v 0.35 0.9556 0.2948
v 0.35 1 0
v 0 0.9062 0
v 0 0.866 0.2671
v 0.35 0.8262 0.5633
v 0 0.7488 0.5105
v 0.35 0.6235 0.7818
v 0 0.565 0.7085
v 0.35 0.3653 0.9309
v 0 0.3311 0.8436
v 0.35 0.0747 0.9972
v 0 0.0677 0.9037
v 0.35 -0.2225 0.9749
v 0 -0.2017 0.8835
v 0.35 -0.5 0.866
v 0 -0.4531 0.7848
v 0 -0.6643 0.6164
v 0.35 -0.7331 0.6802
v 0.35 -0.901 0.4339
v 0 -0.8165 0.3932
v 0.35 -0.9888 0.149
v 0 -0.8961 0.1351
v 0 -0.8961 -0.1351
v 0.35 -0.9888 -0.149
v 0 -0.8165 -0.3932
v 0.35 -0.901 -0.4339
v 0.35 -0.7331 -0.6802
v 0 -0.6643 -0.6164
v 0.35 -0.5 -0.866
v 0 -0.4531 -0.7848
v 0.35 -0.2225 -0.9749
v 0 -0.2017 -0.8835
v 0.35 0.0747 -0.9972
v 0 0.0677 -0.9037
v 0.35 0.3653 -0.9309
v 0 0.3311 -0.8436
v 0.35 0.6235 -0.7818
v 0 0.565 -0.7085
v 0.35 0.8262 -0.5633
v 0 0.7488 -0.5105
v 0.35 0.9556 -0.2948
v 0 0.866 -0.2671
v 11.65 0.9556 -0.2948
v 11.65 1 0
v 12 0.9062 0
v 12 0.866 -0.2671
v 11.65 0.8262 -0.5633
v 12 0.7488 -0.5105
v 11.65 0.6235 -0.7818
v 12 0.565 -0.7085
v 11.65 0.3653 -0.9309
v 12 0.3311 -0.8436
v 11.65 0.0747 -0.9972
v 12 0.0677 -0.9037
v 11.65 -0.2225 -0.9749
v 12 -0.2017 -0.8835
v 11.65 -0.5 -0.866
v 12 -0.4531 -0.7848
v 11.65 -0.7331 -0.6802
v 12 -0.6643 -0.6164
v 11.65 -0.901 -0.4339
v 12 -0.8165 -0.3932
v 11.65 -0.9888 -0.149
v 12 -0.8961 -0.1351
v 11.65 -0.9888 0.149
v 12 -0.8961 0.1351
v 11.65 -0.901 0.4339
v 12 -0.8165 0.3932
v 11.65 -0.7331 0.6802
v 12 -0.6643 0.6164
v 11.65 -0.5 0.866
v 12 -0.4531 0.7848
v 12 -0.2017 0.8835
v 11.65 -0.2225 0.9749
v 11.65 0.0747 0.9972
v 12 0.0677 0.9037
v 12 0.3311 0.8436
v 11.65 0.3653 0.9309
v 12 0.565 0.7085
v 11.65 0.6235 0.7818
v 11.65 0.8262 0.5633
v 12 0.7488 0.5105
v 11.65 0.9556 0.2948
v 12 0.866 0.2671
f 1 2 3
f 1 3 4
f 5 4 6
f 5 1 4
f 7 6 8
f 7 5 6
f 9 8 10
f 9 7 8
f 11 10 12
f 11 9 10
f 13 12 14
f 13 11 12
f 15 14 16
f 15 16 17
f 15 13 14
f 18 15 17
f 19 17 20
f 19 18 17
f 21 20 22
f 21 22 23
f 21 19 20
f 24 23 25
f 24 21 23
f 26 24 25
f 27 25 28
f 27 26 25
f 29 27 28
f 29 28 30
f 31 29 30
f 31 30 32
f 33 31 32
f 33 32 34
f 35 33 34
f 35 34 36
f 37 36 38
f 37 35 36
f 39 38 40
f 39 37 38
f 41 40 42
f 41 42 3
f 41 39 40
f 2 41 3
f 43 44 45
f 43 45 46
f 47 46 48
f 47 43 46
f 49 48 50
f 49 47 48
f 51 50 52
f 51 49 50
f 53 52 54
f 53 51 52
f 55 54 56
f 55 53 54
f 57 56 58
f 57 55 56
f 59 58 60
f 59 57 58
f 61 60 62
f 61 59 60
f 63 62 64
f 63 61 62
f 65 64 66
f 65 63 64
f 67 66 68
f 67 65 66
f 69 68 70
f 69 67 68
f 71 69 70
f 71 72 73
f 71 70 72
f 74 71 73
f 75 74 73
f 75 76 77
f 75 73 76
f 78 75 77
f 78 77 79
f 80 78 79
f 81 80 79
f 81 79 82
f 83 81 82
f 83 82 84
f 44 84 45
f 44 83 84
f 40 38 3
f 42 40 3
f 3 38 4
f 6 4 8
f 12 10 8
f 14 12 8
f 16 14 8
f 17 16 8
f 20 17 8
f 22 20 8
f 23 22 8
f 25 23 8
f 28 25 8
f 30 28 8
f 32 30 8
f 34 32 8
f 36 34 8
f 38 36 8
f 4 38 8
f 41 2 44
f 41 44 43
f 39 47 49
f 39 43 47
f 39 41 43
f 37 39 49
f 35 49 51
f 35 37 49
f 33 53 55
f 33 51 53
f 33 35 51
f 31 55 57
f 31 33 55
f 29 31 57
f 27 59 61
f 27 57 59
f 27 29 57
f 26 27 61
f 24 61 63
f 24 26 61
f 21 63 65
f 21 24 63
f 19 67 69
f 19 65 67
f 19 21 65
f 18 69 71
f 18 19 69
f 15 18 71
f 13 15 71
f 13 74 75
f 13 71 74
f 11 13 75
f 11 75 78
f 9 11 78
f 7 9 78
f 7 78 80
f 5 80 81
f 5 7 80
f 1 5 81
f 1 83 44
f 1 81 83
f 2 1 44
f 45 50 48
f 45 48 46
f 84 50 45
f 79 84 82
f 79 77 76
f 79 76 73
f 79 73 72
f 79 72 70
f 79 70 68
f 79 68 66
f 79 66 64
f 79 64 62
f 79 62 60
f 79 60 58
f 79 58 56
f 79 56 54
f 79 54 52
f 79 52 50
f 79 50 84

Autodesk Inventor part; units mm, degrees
ref_plane "YZ Plane" through (0, 0, 0) normal (1, 0, 0) x (0, 1, 0)
ref_plane "XZ Plane" through (0, 0, 0) normal (0, 1, 0) x (-1, 0, 0)
ref_plane "XY Plane" through (0, 0, 0) normal (0, 0, 1) x (1, 0, 0)
sketch "Skizze" plane through (0, 0, 0) normal (1, 0, 0) x (0, 1, 0)
  circle A0 centre (0, 0) radius 1
  dimension "d1" = 2
extrude "Körper" add sketch "Skizze" along normal blind 12
chamfer "Fase1" distance 0.35 angle 15 1 edges at (0, -1, 0) measured on face at (8, 0.9871, -0.1604)
chamfer "Skizze2" distance 0.35 angle 15 1 edges at (12, -1, 0) measured on face at (8.1167, 0.9871, -0.1604)
equation "\"d1\" = NND"
equation "\"d2\" = NLG"
equation "\"d8\" = PHH"
equation "\"d9\" = FAWI"
equation "\"d12\" = PHH"
equation "\"d4\" = PHH"
equation "\"d5\" = FAWI"
equation "\"d11\" = PHH"
equation "\"NND\" = 2"
equation "\"NLG\" = 12"
equation "\"PHH\" = 0.35"
equation "\"FAWI\" = 15deg"
equation "\"KAH\" = 0"
properties part number "ISO 2338 - 2 h8 x 12" material "Edelstahl, austenitisch"
